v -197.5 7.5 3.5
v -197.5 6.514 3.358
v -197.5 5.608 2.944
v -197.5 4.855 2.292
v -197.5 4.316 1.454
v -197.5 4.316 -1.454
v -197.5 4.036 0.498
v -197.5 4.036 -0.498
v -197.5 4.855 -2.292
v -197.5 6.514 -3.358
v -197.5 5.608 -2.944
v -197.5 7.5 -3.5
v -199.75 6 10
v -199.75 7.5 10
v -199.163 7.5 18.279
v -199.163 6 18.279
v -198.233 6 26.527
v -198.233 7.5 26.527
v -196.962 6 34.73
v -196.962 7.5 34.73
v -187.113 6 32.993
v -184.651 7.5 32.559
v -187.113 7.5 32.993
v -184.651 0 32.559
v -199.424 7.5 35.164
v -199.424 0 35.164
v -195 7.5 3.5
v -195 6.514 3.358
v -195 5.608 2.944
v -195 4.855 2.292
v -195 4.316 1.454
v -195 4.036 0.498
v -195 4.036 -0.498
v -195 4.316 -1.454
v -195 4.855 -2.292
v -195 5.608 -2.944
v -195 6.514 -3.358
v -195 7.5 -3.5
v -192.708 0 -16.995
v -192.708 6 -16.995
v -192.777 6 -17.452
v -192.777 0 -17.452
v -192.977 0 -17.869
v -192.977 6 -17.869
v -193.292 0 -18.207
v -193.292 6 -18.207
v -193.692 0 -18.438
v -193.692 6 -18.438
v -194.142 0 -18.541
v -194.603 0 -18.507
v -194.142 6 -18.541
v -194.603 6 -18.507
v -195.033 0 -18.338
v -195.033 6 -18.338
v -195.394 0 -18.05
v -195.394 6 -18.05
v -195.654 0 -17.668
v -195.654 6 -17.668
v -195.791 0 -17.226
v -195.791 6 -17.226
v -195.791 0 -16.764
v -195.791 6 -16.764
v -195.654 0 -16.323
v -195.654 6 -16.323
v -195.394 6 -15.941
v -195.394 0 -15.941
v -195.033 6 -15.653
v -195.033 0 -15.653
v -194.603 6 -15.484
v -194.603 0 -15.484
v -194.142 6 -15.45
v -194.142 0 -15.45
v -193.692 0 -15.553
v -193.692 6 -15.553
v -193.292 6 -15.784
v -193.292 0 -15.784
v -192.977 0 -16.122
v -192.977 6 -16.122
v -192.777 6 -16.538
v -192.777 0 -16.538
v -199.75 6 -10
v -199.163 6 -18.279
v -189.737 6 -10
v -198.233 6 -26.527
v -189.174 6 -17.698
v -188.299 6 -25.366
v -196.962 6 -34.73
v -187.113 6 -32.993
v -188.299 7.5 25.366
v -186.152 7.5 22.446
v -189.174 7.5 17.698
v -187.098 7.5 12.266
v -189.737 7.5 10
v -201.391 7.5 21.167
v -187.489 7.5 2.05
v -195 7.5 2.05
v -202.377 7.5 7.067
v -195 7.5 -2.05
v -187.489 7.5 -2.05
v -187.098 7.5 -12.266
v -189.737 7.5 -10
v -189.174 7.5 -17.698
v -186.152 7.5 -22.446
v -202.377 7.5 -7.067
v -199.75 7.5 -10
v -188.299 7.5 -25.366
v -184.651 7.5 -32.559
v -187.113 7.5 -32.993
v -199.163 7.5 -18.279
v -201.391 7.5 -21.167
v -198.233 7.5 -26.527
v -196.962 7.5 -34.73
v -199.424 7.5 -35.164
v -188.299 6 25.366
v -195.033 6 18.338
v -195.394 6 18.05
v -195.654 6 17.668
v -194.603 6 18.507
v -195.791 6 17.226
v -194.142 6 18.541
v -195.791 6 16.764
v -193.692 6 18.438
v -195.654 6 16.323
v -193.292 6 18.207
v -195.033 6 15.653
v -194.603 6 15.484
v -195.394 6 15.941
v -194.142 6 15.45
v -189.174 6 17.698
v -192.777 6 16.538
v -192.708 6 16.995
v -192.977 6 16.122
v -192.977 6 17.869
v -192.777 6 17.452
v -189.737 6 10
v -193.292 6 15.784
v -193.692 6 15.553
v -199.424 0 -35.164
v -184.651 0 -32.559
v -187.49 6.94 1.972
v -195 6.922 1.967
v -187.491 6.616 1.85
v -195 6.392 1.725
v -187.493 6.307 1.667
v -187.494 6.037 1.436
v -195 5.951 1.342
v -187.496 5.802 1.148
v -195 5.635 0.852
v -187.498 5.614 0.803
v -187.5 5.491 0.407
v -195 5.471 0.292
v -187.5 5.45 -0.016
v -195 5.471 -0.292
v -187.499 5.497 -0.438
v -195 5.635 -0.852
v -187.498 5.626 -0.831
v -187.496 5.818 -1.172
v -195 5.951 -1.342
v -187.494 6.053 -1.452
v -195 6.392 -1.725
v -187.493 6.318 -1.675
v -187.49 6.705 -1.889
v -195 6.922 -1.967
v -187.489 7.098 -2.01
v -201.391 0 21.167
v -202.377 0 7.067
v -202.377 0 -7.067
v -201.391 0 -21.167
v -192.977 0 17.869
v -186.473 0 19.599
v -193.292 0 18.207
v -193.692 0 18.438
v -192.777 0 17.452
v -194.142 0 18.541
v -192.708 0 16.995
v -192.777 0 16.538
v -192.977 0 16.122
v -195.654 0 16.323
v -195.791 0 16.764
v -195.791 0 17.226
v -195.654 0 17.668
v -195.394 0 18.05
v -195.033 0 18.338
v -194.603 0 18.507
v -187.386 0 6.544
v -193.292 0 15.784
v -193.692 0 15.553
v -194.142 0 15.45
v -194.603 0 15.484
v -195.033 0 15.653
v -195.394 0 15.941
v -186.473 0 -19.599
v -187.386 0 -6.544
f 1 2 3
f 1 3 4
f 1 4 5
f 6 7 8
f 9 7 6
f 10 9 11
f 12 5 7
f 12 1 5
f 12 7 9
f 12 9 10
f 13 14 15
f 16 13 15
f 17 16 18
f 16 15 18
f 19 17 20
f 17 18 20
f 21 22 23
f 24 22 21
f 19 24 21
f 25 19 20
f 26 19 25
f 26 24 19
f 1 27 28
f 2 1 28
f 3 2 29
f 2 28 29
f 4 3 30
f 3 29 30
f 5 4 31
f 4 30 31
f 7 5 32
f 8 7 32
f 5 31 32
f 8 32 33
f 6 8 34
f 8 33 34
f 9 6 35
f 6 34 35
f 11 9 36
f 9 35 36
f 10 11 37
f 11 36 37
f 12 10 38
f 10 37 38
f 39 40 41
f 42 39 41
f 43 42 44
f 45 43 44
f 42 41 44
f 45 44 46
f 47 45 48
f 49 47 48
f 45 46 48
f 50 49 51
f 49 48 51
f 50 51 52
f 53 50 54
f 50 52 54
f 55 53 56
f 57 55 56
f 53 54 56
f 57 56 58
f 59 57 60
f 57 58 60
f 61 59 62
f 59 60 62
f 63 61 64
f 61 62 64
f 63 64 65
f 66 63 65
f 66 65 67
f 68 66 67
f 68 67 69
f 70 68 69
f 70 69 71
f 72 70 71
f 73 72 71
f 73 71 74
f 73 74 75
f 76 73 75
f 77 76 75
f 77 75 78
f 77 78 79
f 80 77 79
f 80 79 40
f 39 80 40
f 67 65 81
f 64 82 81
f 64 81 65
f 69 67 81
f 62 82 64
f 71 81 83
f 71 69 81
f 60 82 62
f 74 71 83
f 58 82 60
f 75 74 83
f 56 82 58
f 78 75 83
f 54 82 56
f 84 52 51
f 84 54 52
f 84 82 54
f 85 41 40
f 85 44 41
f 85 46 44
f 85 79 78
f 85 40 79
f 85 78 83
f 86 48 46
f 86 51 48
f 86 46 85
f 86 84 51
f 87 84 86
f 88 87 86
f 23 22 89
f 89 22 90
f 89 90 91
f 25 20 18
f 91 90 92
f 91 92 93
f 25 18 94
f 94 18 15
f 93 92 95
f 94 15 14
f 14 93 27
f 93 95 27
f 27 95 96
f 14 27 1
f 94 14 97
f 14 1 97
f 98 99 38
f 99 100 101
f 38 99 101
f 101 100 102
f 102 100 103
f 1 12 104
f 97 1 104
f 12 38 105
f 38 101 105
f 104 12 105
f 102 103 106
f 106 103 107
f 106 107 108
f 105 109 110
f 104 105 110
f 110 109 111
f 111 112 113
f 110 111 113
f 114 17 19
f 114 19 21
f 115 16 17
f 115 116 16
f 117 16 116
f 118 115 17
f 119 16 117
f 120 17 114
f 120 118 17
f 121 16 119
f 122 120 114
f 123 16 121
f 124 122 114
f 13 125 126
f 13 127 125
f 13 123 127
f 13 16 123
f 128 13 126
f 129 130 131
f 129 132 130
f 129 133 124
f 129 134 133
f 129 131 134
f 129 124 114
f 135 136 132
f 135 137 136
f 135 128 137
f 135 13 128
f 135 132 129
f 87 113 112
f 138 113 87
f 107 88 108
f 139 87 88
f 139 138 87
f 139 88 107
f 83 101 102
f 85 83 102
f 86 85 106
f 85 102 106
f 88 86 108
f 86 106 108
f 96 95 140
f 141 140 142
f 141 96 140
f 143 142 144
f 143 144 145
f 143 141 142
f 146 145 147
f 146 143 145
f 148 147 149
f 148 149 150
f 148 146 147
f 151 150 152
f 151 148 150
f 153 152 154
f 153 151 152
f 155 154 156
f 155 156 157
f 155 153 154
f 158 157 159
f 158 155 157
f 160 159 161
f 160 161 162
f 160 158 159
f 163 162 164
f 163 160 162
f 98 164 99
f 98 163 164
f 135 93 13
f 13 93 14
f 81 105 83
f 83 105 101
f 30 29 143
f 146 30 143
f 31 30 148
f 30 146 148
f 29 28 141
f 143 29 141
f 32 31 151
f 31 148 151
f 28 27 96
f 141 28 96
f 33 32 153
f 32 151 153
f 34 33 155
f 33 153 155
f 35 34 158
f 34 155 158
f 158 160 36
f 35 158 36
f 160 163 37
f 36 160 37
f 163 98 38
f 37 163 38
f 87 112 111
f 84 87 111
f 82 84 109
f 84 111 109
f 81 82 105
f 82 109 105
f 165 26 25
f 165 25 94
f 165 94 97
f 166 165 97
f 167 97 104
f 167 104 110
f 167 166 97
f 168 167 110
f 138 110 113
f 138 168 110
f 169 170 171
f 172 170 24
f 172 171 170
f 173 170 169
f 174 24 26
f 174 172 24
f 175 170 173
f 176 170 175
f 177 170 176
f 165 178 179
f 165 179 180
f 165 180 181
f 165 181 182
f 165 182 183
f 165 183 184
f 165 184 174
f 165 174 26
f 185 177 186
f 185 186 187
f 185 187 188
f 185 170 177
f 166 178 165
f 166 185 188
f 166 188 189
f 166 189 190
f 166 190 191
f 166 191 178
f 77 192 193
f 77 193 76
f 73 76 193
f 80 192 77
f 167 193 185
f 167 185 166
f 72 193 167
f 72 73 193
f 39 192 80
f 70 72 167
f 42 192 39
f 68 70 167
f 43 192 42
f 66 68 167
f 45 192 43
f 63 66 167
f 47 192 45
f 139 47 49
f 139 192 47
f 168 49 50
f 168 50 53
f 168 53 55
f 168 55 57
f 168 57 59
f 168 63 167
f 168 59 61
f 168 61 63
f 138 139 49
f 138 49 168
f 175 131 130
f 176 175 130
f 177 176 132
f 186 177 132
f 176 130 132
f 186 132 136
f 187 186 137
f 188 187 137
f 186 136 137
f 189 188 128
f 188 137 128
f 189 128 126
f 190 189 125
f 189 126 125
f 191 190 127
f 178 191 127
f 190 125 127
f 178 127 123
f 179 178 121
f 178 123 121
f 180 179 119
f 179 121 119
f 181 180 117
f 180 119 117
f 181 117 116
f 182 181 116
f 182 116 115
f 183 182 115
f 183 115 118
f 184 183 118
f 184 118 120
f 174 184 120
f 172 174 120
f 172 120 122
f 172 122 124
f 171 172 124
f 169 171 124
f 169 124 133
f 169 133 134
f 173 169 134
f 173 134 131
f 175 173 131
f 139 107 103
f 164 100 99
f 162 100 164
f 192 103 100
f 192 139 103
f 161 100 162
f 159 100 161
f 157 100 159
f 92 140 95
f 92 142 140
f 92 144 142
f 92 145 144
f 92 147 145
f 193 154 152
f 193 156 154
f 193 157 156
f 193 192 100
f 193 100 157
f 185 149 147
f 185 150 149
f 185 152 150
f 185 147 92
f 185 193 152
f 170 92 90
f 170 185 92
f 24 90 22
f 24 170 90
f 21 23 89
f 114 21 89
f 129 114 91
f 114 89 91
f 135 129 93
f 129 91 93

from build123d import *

# Parameters (mm, degrees)
BOSS_EXTRUDE1_DEPTH        = 7.5
CUT_EXTRUDE1_DEPTH         = 1.5
SKETCH4_R                  = 3.5
CUT_EXTRUDE3_DEPTH         = 2.5
SKETCH5_R                  = 2.05
CUT_EXTRUDE4_DEPTH         = 38.414330746
F_3_1_3_1_DIAMETER_HOLE1_D = 3.1


with BuildPart() as part:
    # Sketch1 → Boss-Extrude1 (new body)
    with BuildSketch(Plane(origin=(0, 0, 0), x_dir=(1, 0, 0), z_dir=(0, 1, 0))):
        with BuildLine():
            Line((-199.423569985, 35.163755978), (-184.65145369, 32.559033313))
            ThreePointArc((-184.65145369, 32.559033313), (-187.5, 0), (-184.65145369, -32.559033313))
            Line((-184.65145369, -32.559033313), (-199.423569985, -35.163755978))
            ThreePointArc((-199.423569985, -35.163755978), (-202.5, 0), (-199.423569985, 35.163755978))
        make_face()
    extrude(amount=BOSS_EXTRUDE1_DEPTH)

    # Sketch2 → Cut-Extrude1 (cut)
    with BuildSketch(Plane(origin=(0, 7.5, 0), x_dir=(1, 0, 0), z_dir=(0, 1, 0))):
        with BuildLine():
            Line((-187.113473072, 32.993153757), (-196.961550602, 34.729635533))
            ThreePointArc((-196.961550602, 34.729635533), (-198.7407137, 22.408228804), (-199.749843554, 10))
            Line((-199.749843554, 10), (-189.73665961, 10))
            ThreePointArc((-189.73665961, 10), (-188.775466906, 21.536552519), (-187.113473072, 32.993153757))
        make_face()
        with BuildLine():
            Line((-189.73665961, -10), (-199.749843554, -10))
            ThreePointArc((-199.749843554, -10), (-198.7407137, -22.408228804), (-196.961550602, -34.729635533))
            Line((-196.961550602, -34.729635533), (-187.113473072, -32.993153757))
            ThreePointArc((-187.113473072, -32.993153757), (-188.775466906, -21.536552519), (-189.73665961, -10))
        make_face()
    extrude(amount=-CUT_EXTRUDE1_DEPTH, mode=Mode.SUBTRACT)

    # Sketch4 → Cut-Extrude3 (cut)
    with BuildSketch(Plane(origin=(-195, 0, 0), x_dir=(0, 0, -1), z_dir=(1, 0, 0))):
        with Locations((0, 7.5)):
            Circle(SKETCH4_R)
    extrude(amount=-CUT_EXTRUDE3_DEPTH, mode=Mode.SUBTRACT)

    # Sketch5 → Cut-Extrude4 (cut, through all)
    with BuildSketch(Plane(origin=(-195, 0, 0), x_dir=(0, 0, -1), z_dir=(1, 0, 0))):
        with Locations((0, 7.5)):
            Circle(SKETCH5_R)
    extrude(amount=CUT_EXTRUDE4_DEPTH, mode=Mode.SUBTRACT)

    # Ø3.1 (3.1) Diameter Hole1 (through all)
    with Locations(Plane(origin=(0, 0, 0), x_dir=(-1, 0, 0), z_dir=(0, -1, 0))):
        with Locations((194.257966128, -16.995369836), (194.257966128, 16.995369836)):
            Hole(F_3_1_3_1_DIAMETER_HOLE1_D / 2)


solid = part.part
